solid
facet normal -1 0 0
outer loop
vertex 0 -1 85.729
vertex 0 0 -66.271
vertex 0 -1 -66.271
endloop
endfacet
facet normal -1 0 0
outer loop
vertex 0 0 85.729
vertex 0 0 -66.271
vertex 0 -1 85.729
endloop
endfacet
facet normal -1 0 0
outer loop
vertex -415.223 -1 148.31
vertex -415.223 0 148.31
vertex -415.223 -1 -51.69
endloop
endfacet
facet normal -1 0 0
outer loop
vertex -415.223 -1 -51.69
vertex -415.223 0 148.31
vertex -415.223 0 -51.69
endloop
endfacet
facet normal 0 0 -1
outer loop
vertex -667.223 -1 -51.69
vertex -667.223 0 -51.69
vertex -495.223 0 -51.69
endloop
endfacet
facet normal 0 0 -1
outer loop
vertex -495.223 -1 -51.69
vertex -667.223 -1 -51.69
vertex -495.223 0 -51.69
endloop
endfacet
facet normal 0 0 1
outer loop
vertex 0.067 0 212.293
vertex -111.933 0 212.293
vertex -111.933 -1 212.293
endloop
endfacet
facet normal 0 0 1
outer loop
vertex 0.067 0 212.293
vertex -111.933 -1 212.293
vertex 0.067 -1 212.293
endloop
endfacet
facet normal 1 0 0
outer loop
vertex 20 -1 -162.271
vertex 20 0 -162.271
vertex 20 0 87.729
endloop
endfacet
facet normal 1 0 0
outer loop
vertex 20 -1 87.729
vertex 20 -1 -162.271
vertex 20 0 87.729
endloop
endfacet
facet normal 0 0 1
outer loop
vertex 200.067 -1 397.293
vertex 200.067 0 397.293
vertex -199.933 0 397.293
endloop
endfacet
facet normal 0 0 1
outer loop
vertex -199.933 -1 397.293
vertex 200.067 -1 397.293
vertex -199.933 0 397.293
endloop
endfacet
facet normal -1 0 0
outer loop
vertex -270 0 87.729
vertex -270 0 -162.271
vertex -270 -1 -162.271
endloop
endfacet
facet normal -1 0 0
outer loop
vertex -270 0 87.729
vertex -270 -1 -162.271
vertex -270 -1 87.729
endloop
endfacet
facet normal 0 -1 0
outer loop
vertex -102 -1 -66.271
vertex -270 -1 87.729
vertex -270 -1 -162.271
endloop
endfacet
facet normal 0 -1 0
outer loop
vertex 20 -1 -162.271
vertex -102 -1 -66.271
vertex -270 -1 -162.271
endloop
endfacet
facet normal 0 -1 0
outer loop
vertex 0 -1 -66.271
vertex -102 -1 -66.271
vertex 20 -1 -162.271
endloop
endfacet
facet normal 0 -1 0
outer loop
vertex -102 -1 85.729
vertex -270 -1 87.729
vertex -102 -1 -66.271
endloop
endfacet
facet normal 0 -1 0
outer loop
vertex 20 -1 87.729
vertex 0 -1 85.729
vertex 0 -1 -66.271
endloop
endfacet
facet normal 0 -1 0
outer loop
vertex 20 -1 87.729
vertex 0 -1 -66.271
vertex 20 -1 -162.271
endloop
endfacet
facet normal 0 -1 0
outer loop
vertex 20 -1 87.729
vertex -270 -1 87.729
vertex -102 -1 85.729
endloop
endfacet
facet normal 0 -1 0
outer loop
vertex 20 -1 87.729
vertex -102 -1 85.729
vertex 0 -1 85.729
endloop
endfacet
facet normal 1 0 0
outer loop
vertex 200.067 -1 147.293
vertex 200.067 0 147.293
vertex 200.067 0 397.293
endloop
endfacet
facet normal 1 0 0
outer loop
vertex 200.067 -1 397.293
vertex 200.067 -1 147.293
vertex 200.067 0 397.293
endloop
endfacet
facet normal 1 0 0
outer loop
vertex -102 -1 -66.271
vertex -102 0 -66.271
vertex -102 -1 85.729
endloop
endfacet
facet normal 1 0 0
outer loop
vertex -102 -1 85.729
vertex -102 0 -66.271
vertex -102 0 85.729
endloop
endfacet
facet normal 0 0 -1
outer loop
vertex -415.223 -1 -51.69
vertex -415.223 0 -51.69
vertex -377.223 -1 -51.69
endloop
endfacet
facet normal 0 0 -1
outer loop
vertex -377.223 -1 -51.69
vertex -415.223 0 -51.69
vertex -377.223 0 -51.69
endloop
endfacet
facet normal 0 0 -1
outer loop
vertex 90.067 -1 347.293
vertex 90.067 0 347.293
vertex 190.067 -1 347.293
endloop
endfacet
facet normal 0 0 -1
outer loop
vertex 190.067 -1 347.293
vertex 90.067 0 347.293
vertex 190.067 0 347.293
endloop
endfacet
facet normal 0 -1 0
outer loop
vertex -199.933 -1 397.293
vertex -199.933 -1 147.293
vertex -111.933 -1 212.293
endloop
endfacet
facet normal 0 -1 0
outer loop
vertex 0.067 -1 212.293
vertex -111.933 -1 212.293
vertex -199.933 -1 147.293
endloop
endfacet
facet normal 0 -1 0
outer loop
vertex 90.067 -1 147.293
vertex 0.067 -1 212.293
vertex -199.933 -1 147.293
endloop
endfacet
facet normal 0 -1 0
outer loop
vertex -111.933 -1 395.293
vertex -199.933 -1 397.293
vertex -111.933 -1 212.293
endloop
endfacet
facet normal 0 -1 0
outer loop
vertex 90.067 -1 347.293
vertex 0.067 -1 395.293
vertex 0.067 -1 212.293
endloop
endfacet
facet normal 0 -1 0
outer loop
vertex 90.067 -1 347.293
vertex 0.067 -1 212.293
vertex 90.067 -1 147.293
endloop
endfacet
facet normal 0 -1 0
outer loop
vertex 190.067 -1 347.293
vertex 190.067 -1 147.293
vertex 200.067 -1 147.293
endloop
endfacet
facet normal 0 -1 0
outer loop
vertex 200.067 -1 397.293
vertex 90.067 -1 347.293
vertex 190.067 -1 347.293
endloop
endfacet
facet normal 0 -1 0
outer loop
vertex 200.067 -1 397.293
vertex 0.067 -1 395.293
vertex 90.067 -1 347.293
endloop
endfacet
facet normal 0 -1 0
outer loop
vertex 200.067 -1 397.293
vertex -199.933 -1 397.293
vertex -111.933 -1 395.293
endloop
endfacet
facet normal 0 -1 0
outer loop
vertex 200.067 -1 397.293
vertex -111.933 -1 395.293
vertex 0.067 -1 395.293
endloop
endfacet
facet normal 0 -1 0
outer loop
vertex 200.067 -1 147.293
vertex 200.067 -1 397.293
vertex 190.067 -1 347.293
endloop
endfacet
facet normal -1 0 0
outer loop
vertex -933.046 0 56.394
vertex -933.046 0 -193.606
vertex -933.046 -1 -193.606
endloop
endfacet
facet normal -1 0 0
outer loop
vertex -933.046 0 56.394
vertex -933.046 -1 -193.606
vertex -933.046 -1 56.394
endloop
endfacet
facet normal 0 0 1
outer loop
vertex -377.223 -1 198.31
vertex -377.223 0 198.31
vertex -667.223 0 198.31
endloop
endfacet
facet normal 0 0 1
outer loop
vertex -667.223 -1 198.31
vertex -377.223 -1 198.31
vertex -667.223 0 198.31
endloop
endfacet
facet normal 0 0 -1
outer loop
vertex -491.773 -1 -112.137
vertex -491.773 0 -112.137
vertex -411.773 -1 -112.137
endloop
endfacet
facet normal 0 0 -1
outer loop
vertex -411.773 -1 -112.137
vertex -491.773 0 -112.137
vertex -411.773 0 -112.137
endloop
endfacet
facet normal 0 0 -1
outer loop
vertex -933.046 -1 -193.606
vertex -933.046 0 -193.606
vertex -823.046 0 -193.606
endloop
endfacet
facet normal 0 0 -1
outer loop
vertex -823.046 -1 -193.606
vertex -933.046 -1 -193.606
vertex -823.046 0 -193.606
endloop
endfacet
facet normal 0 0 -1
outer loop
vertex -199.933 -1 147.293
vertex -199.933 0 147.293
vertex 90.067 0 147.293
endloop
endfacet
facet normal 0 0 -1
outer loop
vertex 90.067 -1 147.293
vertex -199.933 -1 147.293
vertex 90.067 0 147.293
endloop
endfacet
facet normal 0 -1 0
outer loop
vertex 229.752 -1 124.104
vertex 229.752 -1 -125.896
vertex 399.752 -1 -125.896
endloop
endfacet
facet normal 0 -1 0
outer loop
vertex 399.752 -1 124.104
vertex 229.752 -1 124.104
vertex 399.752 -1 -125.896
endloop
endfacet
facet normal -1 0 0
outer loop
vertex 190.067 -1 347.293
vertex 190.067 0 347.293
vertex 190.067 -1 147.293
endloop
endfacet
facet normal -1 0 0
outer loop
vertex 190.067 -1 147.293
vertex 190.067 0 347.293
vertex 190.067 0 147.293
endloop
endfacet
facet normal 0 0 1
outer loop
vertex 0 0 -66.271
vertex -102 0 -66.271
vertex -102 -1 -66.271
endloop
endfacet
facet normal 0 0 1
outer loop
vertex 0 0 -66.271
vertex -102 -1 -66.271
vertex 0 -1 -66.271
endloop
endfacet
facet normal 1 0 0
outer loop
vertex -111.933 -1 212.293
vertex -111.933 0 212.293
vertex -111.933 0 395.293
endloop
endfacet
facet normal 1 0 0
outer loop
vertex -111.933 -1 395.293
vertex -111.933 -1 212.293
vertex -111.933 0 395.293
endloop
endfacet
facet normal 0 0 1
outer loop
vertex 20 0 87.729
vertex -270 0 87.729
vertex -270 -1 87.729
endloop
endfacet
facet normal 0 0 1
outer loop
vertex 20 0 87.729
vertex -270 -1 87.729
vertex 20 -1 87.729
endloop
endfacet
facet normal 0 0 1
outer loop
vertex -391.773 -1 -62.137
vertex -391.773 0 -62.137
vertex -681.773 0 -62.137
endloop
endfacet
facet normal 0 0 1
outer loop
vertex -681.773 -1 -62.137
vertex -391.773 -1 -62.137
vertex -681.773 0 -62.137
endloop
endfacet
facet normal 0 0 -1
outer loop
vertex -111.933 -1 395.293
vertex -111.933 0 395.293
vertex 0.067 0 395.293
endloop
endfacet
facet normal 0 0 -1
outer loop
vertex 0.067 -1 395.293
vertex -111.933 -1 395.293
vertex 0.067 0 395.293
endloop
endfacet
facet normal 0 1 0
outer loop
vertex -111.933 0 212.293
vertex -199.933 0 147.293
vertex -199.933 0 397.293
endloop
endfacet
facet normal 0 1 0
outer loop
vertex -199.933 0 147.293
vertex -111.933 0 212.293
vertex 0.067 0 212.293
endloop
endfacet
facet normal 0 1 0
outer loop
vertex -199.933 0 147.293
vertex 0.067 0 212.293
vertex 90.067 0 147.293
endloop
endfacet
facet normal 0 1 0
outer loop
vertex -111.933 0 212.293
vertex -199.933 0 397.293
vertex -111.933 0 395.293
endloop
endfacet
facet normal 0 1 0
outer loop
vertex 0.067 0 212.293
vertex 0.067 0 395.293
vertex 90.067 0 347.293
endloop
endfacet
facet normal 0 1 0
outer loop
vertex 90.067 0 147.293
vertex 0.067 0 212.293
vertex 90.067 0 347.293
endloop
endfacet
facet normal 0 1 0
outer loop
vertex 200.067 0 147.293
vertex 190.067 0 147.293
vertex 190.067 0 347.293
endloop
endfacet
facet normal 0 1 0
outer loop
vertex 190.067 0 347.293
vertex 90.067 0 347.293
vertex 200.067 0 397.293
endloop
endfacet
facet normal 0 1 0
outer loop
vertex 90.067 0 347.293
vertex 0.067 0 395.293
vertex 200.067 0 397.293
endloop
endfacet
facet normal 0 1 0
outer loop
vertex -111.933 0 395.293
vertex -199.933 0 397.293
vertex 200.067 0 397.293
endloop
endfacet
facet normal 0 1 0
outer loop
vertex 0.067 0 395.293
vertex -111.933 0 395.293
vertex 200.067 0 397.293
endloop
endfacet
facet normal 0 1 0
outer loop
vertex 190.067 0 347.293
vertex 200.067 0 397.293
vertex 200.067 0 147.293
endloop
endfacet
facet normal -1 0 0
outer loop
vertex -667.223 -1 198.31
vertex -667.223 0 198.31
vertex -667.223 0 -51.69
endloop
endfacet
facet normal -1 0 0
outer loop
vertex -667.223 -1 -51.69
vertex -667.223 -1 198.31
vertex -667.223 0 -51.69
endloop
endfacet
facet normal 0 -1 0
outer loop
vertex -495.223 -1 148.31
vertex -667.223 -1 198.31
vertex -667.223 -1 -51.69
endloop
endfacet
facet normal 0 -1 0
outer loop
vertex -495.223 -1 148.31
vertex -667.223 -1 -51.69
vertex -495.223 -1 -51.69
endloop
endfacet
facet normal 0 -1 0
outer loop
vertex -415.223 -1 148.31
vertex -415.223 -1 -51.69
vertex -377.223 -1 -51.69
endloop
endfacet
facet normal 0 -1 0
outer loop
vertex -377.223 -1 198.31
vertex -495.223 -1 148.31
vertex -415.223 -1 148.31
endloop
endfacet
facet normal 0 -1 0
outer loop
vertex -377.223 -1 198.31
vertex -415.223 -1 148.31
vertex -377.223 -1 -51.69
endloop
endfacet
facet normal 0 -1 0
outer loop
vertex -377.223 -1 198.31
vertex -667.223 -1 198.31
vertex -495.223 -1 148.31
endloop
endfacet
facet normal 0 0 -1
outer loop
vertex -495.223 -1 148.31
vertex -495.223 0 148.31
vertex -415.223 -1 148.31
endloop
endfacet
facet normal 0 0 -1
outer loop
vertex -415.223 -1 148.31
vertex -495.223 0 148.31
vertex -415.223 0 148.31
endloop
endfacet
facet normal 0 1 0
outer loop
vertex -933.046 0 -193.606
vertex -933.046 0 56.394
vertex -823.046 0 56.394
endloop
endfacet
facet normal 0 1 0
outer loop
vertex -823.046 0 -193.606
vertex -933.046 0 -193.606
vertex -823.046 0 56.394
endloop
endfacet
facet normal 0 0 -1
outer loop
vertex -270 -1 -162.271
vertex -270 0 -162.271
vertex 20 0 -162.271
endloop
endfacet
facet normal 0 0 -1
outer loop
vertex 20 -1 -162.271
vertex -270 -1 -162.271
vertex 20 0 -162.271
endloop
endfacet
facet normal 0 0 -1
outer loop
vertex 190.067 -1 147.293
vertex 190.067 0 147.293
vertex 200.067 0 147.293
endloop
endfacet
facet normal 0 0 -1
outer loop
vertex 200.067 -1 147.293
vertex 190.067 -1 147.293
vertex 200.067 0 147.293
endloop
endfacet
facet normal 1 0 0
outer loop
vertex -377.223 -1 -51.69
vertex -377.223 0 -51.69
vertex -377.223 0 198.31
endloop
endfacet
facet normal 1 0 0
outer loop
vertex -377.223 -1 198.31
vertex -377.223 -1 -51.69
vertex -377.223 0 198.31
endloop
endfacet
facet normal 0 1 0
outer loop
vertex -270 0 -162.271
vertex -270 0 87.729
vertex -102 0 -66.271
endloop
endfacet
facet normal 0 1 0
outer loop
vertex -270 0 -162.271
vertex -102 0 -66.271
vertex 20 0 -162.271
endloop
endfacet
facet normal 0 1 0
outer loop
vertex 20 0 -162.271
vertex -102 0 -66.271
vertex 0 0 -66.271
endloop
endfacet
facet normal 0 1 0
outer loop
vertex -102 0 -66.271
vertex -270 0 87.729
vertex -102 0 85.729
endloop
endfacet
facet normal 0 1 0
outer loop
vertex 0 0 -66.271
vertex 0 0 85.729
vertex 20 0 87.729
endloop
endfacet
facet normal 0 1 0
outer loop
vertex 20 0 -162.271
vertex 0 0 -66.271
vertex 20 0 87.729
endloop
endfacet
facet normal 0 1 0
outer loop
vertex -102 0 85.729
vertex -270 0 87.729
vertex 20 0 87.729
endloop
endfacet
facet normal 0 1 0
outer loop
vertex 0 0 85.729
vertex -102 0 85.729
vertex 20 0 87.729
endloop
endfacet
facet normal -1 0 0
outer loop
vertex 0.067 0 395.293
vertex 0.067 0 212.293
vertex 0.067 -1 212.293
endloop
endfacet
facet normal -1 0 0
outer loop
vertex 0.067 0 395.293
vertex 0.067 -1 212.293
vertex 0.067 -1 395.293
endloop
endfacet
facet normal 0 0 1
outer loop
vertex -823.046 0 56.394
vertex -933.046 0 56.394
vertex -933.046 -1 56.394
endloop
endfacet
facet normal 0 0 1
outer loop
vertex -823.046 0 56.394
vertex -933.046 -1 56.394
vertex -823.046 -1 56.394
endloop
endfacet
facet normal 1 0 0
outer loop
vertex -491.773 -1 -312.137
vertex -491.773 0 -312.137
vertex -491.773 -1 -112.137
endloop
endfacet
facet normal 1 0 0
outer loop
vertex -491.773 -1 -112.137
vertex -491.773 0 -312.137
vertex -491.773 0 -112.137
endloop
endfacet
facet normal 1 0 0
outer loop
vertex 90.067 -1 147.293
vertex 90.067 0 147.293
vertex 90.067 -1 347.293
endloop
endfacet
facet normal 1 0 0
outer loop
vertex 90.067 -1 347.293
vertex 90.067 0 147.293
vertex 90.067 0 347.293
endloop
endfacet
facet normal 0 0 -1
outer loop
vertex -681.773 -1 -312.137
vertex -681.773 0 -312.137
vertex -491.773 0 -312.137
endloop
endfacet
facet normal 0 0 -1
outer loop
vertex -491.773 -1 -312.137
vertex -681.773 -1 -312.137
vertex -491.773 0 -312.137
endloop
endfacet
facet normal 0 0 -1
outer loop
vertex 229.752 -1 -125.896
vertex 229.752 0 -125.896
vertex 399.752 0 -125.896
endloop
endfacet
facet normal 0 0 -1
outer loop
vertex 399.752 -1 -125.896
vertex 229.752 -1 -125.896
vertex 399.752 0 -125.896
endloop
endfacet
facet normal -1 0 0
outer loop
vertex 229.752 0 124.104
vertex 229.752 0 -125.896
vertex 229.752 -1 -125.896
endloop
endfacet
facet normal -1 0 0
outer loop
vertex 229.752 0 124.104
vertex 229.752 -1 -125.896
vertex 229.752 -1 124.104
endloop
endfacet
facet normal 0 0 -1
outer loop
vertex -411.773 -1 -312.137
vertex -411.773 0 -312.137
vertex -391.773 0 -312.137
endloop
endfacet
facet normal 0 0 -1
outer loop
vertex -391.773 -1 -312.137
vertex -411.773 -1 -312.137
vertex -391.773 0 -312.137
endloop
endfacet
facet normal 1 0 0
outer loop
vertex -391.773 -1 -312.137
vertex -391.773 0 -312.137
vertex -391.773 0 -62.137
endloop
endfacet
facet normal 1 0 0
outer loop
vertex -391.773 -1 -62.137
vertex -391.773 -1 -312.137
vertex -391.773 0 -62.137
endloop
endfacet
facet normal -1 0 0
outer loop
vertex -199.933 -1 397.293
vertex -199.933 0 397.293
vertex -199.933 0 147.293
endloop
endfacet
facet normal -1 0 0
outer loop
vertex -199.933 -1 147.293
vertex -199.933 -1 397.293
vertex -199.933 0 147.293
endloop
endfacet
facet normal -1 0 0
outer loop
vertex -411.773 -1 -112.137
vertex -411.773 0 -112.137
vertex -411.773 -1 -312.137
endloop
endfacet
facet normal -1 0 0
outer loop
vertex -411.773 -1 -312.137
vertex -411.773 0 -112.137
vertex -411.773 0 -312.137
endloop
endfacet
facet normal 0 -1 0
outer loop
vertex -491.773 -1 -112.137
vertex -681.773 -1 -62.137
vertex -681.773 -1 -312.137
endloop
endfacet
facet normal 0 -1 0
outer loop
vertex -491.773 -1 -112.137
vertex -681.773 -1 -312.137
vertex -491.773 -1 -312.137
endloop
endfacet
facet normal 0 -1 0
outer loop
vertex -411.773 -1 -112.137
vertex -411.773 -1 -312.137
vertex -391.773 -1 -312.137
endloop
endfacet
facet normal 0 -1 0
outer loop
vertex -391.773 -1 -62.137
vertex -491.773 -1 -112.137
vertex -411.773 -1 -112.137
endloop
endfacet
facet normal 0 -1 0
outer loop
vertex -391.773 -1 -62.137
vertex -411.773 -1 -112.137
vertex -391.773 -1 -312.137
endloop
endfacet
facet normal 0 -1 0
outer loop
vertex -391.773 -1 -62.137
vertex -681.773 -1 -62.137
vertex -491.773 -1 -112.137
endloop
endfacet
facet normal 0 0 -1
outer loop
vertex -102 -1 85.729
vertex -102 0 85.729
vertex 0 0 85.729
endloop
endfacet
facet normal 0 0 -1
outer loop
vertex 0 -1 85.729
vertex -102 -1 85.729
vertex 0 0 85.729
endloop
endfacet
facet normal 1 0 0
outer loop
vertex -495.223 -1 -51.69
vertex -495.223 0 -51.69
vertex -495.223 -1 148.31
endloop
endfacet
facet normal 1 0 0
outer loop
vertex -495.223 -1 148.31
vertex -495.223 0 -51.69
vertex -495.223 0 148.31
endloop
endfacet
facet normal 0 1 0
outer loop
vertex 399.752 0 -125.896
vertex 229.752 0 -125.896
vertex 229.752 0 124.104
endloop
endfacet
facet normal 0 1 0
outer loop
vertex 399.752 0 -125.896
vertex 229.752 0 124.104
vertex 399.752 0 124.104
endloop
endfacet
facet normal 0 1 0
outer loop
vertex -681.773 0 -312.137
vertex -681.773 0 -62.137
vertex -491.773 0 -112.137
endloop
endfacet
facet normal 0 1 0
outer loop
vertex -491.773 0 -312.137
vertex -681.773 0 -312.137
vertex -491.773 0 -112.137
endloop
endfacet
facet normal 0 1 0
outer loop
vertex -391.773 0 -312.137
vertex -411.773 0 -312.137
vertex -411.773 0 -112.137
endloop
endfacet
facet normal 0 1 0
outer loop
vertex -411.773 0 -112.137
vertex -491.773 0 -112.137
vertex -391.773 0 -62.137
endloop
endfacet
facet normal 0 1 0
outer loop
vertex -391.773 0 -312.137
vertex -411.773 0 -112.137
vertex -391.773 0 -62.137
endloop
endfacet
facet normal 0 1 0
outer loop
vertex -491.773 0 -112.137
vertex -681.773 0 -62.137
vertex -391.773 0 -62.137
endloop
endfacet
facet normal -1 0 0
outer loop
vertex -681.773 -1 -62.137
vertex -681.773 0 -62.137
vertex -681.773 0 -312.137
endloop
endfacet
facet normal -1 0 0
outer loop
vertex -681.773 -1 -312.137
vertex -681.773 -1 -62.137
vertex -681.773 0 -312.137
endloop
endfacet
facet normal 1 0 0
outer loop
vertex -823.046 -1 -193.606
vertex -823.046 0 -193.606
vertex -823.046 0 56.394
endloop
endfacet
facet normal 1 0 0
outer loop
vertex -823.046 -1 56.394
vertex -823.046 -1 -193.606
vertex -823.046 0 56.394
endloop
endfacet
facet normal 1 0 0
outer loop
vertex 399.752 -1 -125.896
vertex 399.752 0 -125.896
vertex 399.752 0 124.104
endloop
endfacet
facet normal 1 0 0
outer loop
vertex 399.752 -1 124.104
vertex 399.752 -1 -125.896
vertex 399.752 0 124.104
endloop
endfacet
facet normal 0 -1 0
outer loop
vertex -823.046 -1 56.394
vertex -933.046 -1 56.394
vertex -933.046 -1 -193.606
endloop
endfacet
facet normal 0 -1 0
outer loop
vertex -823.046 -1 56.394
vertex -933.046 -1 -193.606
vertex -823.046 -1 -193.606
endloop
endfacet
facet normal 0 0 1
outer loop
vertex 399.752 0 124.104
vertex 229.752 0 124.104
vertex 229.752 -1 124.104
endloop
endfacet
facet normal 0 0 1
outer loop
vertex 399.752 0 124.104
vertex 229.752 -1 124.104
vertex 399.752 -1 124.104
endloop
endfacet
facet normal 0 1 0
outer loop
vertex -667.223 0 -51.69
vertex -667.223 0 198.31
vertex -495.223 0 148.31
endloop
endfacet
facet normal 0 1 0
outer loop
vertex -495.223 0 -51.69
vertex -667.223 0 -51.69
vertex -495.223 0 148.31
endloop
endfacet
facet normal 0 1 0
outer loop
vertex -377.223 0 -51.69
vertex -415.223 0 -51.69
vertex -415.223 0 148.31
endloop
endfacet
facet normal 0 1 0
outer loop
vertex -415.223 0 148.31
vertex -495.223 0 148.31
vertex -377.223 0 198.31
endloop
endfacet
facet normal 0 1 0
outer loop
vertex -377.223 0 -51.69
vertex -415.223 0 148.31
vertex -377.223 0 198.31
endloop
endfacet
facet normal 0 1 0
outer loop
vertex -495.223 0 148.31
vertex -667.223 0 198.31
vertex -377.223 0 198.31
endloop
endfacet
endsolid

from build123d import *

# Parameters (mm, degrees)
F0_W     = 112
F0_H     = 183
F0_W_2   = 290
F0_H_2   = 250
F0_W_3   = 102
F0_H_3   = 152
F0_W_4   = 170
F1_DEPTH = 1
F2_W     = 110
F2_H     = 250
F3_DEPTH = 1


with BuildPart() as f1:
    # F0 (on Front) → F1 (new body)
    with BuildSketch(Plane.XZ):
        Polygon((-377.223074, 198.309932), (-667.223074, 198.309932), (-667.223074, -51.690068), (-495.223074, -51.690068), (-495.223074, 148.309932), (-415.223074, 148.309932), (-415.223074, -51.690068), (-377.223074, -51.690068), align=None)
        Polygon((-391.773194, -62.136889), (-681.773194, -62.136889), (-681.773194, -312.136889), (-491.773194, -312.136889), (-491.773194, -112.136889), (-411.773194, -112.136889), (-411.773194, -312.136889), (-391.773194, -312.136889), align=None)
        Polygon((200.066924, 397.292525), (-199.933076, 397.292525), (-199.933076, 147.292525), (90.066924, 147.292525), (90.066924, 347.292525), (190.066924, 347.292525), (190.066924, 147.292525), (200.066924, 147.292525), align=None)
        with Locations((-55.933076, 303.792525)):
            Rectangle(F0_W, F0_H, mode=Mode.SUBTRACT)
        with Locations((-125, -37.270844)):
            Rectangle(F0_W_2, F0_H_2)
        with Locations((-51, 9.729156)):
            Rectangle(F0_W_3, F0_H_3, mode=Mode.SUBTRACT)
        with Locations((314.752408, -0.89559)):
            Rectangle(F0_W_4, F0_H_2)
    extrude(amount=F1_DEPTH)


with BuildPart() as f3:
    # F2 (on Front) → F3 (new body)
    with BuildSketch(Plane.XZ):
        with Locations((-878.046148, -68.605915)):
            Rectangle(F2_W, F2_H)
    extrude(amount=F3_DEPTH)


solid = Compound([f1.part, f3.part])
